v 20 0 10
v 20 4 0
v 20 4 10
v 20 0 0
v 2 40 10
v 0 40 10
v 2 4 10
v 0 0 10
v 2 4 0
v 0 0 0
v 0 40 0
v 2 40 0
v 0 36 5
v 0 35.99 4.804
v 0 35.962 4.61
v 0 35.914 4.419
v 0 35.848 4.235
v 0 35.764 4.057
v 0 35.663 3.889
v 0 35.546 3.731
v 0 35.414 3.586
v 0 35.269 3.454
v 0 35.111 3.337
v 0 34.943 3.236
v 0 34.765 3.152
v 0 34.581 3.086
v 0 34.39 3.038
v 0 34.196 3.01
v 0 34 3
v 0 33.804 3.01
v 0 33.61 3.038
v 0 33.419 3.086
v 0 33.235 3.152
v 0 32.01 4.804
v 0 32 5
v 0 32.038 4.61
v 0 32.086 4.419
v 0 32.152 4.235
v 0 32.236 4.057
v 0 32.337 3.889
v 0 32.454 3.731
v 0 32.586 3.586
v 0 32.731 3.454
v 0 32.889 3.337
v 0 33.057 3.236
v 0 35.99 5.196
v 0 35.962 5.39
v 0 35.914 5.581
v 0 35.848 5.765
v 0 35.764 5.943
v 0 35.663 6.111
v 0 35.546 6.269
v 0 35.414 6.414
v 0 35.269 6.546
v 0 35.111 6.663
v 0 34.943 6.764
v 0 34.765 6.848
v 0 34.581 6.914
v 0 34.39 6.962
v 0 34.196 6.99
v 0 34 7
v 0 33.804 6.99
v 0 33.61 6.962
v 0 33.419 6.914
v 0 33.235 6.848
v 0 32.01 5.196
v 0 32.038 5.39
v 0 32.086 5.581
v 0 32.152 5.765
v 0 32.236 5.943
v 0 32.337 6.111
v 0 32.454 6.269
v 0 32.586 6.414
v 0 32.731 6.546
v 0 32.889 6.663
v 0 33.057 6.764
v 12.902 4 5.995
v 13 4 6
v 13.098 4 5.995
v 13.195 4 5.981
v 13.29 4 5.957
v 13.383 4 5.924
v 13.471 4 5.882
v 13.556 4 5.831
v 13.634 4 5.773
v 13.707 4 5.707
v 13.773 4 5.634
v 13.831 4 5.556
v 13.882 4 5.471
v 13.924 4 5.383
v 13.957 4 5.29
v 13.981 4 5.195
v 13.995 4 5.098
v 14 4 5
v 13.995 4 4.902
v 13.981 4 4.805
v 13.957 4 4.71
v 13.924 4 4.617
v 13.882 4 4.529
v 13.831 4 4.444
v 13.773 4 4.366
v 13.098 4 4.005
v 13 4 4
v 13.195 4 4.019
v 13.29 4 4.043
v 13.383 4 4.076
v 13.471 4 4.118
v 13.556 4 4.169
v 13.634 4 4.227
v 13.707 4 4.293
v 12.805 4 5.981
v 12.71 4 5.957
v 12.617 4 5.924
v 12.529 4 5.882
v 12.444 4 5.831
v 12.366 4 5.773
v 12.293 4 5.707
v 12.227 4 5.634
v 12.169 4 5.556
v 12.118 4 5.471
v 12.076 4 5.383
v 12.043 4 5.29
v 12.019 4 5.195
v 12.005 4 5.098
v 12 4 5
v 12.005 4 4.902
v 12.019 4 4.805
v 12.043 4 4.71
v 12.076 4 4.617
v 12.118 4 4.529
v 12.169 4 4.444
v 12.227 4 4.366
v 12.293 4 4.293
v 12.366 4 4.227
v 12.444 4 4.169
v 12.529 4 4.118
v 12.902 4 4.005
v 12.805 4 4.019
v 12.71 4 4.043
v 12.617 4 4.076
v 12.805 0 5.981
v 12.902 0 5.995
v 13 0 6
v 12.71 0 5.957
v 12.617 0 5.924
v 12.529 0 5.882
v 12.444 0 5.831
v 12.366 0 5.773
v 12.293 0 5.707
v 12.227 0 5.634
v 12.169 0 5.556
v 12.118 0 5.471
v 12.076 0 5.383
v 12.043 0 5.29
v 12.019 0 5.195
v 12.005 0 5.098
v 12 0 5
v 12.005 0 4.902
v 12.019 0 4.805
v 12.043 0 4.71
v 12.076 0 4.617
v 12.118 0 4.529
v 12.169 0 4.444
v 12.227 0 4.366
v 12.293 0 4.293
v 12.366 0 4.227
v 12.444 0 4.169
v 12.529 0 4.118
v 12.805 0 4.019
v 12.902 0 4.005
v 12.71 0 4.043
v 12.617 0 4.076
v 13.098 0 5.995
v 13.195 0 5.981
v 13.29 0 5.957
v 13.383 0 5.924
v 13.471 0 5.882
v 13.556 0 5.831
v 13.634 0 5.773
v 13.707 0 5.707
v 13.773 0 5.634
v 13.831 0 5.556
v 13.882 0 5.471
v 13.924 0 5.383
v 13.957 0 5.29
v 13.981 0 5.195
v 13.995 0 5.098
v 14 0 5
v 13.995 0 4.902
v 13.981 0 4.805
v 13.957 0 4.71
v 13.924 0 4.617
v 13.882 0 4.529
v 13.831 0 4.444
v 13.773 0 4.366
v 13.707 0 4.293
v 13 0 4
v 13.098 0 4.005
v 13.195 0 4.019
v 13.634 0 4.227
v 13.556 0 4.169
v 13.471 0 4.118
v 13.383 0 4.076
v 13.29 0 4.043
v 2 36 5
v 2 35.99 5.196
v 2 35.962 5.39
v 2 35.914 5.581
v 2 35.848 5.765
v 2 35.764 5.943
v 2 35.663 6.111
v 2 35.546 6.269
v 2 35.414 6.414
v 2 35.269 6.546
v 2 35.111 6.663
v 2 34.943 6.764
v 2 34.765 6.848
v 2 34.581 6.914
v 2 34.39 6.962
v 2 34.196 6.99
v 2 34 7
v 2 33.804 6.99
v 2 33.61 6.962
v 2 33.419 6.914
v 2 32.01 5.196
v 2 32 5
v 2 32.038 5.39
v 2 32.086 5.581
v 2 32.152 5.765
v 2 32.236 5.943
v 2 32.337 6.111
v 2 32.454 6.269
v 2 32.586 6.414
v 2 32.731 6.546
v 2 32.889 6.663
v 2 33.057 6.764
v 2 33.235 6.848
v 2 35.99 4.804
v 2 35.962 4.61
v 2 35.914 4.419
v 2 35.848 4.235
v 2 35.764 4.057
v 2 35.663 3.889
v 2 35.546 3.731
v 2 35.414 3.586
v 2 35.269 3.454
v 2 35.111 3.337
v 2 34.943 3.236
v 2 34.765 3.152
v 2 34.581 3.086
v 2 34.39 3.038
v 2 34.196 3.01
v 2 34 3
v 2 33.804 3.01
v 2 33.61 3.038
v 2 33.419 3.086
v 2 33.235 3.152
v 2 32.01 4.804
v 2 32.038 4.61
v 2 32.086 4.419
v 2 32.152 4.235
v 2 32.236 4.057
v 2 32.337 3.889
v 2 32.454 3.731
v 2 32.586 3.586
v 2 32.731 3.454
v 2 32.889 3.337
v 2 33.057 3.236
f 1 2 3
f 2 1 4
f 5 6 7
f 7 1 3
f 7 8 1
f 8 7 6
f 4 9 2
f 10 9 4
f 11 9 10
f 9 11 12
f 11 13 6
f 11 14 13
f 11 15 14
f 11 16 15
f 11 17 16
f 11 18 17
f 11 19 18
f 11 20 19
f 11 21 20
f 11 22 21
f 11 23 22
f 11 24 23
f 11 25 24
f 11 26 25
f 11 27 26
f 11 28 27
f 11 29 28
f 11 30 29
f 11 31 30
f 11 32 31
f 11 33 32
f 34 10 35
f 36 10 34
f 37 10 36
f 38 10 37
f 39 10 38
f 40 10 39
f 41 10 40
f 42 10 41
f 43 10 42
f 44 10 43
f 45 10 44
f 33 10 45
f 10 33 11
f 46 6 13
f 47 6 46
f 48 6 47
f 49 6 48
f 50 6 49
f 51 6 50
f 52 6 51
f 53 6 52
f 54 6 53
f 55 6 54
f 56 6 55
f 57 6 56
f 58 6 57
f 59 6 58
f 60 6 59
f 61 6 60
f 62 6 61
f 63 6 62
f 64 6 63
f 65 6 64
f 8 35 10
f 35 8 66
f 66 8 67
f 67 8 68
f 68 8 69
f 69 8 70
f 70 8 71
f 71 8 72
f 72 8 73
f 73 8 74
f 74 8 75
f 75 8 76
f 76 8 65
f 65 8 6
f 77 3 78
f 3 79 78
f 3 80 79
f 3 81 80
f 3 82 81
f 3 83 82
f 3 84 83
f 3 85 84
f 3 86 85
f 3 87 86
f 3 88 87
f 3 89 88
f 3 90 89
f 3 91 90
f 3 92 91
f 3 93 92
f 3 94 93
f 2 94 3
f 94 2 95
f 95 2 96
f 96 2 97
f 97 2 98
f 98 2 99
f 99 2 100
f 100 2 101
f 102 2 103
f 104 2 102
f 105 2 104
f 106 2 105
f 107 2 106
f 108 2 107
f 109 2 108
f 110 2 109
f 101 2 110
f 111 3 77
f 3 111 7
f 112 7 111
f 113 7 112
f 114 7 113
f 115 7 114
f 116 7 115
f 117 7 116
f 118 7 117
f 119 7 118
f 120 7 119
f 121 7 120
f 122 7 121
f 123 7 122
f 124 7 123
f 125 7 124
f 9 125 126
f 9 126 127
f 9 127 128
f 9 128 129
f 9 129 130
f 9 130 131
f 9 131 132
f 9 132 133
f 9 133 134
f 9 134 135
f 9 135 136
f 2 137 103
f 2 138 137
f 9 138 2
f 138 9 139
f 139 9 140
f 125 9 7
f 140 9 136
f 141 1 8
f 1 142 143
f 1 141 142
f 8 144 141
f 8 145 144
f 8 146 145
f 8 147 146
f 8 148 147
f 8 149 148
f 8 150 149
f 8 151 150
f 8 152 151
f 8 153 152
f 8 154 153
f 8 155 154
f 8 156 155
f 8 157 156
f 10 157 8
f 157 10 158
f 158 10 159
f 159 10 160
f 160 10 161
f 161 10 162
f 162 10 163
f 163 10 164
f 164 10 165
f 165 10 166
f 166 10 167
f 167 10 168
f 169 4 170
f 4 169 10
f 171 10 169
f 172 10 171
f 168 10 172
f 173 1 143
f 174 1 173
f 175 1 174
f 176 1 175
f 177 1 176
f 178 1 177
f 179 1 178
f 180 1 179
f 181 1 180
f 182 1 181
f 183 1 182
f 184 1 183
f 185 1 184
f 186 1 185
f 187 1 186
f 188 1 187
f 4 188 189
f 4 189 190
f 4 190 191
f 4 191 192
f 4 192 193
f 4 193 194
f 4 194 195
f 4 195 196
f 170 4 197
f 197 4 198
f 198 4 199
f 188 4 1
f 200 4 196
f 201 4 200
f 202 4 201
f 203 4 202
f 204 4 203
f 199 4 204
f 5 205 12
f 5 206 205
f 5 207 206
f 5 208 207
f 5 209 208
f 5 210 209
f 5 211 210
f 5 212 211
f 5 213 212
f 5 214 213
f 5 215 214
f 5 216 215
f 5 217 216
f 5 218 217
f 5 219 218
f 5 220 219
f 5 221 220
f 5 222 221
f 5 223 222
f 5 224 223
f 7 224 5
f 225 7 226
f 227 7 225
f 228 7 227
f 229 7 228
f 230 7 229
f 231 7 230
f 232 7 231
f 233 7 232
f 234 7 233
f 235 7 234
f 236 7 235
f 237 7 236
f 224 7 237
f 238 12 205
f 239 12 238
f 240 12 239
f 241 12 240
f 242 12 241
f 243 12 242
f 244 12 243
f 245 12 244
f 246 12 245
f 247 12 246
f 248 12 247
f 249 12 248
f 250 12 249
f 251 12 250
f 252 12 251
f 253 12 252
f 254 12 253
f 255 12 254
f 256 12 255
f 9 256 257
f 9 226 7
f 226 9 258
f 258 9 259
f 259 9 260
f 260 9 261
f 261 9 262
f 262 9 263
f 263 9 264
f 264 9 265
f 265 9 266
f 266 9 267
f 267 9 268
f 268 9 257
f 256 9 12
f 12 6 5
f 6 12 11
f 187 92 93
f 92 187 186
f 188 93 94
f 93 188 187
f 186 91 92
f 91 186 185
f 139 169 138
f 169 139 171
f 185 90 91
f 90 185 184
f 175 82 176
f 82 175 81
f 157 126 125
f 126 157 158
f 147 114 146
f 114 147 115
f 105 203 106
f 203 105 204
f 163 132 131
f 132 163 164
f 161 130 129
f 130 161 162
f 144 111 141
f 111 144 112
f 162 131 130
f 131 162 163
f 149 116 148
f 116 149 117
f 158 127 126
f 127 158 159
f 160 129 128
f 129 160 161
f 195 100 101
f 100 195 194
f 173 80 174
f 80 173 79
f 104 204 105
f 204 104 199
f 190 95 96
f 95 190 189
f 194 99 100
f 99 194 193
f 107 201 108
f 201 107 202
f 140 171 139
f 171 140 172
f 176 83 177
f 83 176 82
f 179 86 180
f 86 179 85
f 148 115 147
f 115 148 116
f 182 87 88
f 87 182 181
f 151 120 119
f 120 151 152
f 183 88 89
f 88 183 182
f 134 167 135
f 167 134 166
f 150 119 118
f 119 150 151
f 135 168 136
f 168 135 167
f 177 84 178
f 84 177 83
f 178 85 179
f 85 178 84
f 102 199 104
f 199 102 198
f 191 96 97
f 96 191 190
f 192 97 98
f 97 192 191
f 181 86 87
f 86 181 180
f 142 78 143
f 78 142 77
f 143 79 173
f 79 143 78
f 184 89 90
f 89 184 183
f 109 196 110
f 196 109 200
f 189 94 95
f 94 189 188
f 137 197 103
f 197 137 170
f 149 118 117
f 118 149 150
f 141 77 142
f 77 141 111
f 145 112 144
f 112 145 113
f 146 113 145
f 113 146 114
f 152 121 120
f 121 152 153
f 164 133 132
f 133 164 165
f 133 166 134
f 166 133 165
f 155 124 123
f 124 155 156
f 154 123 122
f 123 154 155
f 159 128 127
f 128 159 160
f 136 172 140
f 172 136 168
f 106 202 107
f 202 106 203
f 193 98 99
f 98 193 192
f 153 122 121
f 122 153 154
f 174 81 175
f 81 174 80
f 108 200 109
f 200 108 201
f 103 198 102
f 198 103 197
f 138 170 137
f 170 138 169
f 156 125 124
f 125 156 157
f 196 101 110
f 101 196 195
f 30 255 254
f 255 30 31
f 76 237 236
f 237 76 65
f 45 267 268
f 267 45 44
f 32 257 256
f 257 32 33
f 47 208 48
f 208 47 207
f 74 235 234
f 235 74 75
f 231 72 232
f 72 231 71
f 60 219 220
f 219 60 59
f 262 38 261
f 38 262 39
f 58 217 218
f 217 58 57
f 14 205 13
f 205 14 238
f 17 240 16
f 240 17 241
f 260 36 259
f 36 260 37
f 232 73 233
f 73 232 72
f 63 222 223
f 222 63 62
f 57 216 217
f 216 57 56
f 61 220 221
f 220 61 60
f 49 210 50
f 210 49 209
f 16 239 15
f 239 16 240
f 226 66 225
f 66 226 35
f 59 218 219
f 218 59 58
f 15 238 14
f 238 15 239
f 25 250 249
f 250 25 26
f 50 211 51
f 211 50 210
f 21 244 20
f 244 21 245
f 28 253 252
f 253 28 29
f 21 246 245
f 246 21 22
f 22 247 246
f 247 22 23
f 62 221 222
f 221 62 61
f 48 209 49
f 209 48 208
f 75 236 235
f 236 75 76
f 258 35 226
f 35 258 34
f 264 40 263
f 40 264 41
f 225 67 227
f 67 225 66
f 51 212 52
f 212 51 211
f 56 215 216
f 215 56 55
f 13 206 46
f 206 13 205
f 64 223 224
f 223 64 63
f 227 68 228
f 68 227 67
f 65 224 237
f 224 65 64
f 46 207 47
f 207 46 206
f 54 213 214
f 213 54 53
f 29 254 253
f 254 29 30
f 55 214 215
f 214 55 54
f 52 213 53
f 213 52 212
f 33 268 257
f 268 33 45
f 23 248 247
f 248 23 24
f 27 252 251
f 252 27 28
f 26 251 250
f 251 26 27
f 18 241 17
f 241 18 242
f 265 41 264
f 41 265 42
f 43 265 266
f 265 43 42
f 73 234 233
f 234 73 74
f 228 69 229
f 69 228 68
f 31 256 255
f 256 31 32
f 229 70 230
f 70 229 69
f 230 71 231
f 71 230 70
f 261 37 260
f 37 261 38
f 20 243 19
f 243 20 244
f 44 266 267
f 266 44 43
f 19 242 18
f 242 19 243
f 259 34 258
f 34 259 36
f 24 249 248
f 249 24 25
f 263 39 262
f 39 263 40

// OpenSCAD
// Global Options
$fn = 64;

// Options
width = 10;
length1 = 20;
length2 = 40;
thickness1 = 4;
thickness2 = 2;
holeRadius1 = 1;
holeOffset1 = 6;
holeRadius2 = 2;
holeOffset2 = 4;

// Tube
difference()
{
    union()
    {
        cube([length1, thickness1, width], center=false);
        cube([thickness2, length2, width], center=false);
    }
    union()
    {
        translate([length1 - holeOffset1 - holeRadius1, thickness1 + 0.01, width / 2])
        {
            rotate([90, 0, 0])
            {
                cylinder(thickness1 + 0.02, holeRadius1, holeRadius1, center=false);
            }
        }
        translate([thickness2 + 0.01, length2 - holeOffset2 - holeRadius2, width / 2])
        {
            rotate([0, -90, 0])
            {
                cylinder(thickness2 + 0.02, holeRadius2, holeRadius2, center=false);
            }
        }
    }
}
